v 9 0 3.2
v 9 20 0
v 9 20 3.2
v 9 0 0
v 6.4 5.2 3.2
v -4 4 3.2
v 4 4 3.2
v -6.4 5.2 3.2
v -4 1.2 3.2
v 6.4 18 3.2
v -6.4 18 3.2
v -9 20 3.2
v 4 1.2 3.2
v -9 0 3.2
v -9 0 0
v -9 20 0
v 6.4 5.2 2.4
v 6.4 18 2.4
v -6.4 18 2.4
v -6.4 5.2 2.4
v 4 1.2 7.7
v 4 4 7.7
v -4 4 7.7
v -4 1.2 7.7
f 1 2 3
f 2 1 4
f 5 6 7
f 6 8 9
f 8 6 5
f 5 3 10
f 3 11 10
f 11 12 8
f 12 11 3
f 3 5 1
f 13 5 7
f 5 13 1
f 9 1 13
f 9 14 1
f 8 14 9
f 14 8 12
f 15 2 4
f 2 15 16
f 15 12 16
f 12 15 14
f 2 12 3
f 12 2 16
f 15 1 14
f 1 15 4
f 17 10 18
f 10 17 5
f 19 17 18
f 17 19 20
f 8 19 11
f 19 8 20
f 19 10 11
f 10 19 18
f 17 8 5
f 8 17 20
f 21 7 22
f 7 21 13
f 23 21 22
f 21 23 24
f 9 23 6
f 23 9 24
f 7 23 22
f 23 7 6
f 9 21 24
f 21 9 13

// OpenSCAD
// 20_barrette_PETG_x8.scad
// EXO-MEDUSA v6.2 — piece 20 "barrette racine" PETG x8
//
// Hangs the PET 0.3 mm film from the FIXED stator ring (NOTICE etape 10).
// Film 12 x 12 mm root tab (GABARIT) glues into the cuvette.
// Male teton is the 8.0 x 2.8 family that fits fentes 8.6 x 3.0.
//
// Print: PETG, a plat (body on bed, teton up), x8, 1 plate. (NOTICE etape 0)
//
// openscad -o 20_barrette_PETG_x8.stl 20_barrette_PETG_x8.scad

/* [slot teton — FIXED ring 08s, ring_t=4, fentes 8.6 x 3.0] */
tab_w = 8.0;         // SOURCE medusa_v6.scad clamp tab_w / part 21
tab_t = 2.8;         // SOURCE 2.8
tab_h = 4.5;      // ring_t=4 + 0.5 mm so a glue fillet sits on the ring

/* [cuvette — GABARIT_FLANCS_1-1.pdf film teton] */
film_tet_w = 12.0; // mm  SOURCE gabarit teton width 12.00 (34.0158 pt)
film_tet_l = 12.0; // mm  SOURCE gabarit teton length 12.00
cuvette_clear = 0.4; // mm/side glue gap
cuvette_d = 0.8;     // mm  pocket depth (film is 0.3)
cuvette_w = film_tet_w + 2*cuvette_clear;  // 12.8
cuvette_l = film_tet_l + 2*cuvette_clear;

/* [body] */
body_w = 18.0;       // mm  across (12 mm teton + walls)
body_l = 20.0;       // mm  along tentacle
body_h = 3.2;       // mm  SOURCE part 21 root plate 3.2
inboard = 1.2;     // mm  plastic inboard of teton
gap_tc  = 1.2;      // mm  teton -> cuvette

$fn = 24;

module barrette() {
    cuv_y0 = inboard + tab_t + gap_tc;
    difference() {
        translate([-body_w/2, 0, 0]) cube([body_w, body_l, body_h]);
        // cuvette open to +Z, outboard of teton
        translate([-cuvette_w/2, cuv_y0, body_h-cuvette_d])
            cube([cuvette_w, cuvette_l, cuvette_d+0.1]);
    }
    // teton +Z — insert from below into anneau FIXE (stator)
    translate([-tab_w/2, inboard, body_h]) cube([tab_w, tab_t, tab_h]);
}

barrette();
